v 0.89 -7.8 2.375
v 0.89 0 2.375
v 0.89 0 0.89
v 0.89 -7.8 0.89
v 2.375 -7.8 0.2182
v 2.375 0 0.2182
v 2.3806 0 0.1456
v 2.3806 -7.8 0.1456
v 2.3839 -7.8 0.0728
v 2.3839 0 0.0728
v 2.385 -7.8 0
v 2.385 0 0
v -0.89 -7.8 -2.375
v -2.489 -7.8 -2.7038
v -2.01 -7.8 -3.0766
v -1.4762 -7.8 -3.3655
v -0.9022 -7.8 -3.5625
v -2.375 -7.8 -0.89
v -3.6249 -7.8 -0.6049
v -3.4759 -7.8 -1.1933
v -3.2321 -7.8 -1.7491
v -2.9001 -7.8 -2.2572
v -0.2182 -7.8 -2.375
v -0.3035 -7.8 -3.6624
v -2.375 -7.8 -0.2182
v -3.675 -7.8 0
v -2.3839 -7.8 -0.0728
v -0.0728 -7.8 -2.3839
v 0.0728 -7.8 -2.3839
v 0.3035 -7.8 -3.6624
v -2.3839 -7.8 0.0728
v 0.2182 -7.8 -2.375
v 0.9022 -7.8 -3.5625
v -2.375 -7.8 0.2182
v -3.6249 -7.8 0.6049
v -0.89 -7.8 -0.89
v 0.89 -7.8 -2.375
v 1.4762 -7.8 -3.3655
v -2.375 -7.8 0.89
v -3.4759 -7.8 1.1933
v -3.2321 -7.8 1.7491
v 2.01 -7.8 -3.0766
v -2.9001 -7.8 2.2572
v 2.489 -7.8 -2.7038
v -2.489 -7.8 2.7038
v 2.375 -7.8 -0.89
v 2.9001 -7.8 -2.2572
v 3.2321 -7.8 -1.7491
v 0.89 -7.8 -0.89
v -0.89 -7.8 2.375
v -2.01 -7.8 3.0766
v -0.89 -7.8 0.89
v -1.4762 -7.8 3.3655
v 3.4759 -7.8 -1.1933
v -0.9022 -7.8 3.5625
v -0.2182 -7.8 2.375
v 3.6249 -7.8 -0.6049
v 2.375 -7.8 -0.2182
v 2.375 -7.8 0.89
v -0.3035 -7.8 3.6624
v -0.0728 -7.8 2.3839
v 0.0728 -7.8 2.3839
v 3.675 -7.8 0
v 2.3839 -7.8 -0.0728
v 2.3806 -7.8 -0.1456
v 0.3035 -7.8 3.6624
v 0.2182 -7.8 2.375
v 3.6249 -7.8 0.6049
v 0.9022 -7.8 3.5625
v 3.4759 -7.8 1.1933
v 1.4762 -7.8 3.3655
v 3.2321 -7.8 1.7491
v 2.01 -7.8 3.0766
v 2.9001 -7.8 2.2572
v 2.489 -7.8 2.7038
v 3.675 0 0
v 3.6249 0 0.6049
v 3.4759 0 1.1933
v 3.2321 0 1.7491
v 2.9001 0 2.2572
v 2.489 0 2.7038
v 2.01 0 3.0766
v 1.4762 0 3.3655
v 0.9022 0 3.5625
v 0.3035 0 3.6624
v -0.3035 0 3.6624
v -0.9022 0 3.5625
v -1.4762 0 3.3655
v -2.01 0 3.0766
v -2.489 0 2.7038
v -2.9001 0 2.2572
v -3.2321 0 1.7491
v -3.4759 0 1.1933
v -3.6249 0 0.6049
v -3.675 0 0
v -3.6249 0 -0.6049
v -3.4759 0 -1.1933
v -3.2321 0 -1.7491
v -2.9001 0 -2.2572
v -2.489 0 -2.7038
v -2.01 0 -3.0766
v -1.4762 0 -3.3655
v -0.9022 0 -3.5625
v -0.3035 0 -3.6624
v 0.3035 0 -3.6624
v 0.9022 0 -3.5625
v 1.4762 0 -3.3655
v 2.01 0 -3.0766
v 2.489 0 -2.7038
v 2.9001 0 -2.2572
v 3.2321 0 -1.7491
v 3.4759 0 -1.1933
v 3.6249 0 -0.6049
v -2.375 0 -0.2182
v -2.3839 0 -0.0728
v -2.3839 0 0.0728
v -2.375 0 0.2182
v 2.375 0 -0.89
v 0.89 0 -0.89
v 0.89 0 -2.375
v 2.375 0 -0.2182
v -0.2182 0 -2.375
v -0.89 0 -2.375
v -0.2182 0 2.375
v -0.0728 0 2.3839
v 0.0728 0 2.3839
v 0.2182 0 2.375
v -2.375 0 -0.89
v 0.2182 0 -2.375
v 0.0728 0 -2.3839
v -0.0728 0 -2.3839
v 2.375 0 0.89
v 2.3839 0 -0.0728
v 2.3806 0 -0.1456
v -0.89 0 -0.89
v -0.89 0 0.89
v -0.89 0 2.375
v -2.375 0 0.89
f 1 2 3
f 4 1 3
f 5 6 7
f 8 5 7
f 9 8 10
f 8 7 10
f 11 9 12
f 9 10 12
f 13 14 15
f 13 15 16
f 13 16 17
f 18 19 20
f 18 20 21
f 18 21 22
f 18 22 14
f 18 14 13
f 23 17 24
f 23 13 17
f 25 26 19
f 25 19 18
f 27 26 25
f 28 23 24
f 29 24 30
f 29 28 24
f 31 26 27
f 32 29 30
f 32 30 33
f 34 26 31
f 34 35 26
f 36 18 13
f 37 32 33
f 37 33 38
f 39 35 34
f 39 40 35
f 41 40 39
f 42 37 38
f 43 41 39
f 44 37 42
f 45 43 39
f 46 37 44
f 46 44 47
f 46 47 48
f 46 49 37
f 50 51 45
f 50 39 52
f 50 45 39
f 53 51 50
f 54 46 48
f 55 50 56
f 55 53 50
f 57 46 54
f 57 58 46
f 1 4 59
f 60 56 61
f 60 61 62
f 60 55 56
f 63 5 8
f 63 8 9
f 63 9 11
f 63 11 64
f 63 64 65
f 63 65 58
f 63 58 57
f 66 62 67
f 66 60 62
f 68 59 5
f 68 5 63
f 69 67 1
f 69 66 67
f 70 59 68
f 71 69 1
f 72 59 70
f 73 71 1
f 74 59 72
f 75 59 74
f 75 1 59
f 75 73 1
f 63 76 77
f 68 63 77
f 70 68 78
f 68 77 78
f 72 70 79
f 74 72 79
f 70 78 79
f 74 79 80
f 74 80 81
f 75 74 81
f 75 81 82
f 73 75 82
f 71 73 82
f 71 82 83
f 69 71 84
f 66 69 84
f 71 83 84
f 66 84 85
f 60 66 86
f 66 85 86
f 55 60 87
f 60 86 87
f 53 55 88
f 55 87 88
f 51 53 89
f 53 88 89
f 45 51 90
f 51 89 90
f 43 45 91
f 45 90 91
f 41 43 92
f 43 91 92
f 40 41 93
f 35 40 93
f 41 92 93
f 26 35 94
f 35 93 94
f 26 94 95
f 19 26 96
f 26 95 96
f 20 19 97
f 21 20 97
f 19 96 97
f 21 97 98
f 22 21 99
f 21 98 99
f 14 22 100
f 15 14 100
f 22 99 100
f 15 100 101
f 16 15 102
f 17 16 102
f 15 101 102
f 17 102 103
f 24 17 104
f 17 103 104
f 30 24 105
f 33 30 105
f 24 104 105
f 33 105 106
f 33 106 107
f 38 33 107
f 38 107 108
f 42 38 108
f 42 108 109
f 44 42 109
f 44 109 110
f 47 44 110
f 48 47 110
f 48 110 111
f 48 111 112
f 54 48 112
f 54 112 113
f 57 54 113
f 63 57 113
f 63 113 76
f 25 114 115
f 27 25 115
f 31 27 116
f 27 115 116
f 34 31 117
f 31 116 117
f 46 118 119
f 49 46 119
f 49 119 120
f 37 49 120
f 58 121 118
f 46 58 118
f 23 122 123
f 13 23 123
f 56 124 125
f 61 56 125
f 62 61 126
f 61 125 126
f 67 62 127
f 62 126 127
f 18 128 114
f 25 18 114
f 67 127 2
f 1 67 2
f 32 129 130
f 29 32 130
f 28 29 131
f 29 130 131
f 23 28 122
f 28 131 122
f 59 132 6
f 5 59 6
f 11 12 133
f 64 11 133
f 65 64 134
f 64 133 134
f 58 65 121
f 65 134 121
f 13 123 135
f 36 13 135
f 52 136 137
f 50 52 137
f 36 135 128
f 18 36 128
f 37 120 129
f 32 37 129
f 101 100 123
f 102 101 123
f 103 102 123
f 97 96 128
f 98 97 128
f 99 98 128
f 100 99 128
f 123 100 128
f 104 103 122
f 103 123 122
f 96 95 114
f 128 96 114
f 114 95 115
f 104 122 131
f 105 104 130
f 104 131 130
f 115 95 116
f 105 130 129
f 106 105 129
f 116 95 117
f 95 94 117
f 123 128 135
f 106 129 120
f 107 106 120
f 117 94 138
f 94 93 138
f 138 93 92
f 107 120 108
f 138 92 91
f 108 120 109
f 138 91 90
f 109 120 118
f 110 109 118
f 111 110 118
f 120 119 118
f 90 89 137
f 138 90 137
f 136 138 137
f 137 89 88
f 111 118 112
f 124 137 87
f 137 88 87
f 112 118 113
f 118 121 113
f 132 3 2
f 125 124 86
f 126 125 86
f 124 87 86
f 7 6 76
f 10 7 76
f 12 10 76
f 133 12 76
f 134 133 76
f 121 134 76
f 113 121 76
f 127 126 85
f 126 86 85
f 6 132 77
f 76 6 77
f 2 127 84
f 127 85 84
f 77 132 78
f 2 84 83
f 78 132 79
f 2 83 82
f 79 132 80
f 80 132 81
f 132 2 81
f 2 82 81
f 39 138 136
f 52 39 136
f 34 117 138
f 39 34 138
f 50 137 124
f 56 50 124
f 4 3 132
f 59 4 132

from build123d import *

# Parameters (mm, degrees)
F0_R     = 3.675
F1_DEPTH = 7.8
F2_DEPTH = 7.8


# Not quite as in the source:
# - a feature names something its author has since deleted; it is built from what else it names


with BuildPart() as f1:
    # F0 (on Front) → F1 (new body)
    with BuildSketch(Plane.XZ):
        Circle(F0_R)
        with BuildLine():
            Line((-2.375, 0.2181742423), (-2.375, 0.89))
            Line((-2.375, 0.89), (-2.2127189157, 0.89))
            ThreePointArc((-2.2127189157, 0.89), (-1.6864496731, 1.6864496731), (-0.89, 2.2127189157))
            Line((-0.89, 2.2127189157), (-0.89, 2.375))
            Line((-0.89, 2.375), (-0.2181742423, 2.375))
            ThreePointArc((-0.2181742423, 2.375), (0, 2.385), (0.2181742423, 2.375))
            Line((0.2181742423, 2.375), (0.89, 2.375))
            Line((0.89, 2.375), (0.89, 2.2127189157))
            ThreePointArc((0.89, 2.2127189157), (1.6864496731, 1.6864496731), (2.2127189157, 0.89))
            Line((2.2127189157, 0.89), (2.375, 0.89))
            Line((2.375, 0.89), (2.375, 0.2181742423))
            ThreePointArc((2.375, 0.2181742423), (2.3824986884, 0.1092016483), (2.385, 0))
            ThreePointArc((2.385, 0), (2.3824986884, -0.1092016483), (2.375, -0.2181742423))
            Line((2.375, -0.2181742423), (2.375, -0.89))
            Line((2.375, -0.89), (2.2127189157, -0.89))
            ThreePointArc((2.2127189157, -0.89), (1.6864496731, -1.6864496731), (0.89, -2.2127189157))
            Line((0.89, -2.2127189157), (0.89, -2.375))
            Line((0.89, -2.375), (0.2181742423, -2.375))
            ThreePointArc((0.2181742423, -2.375), (0, -2.385), (-0.2181742423, -2.375))
            Line((-0.2181742423, -2.375), (-0.89, -2.375))
            Line((-0.89, -2.375), (-0.89, -2.2127189157))
            ThreePointArc((-0.89, -2.2127189157), (-1.6864496731, -1.6864496731), (-2.2127189157, -0.89))
            Line((-2.2127189157, -0.89), (-2.375, -0.89))
            Line((-2.375, -0.89), (-2.375, -0.2181742423))
            ThreePointArc((-2.375, -0.2181742423), (-2.385, 0), (-2.375, 0.2181742423))
        make_face(mode=Mode.SUBTRACT)
    extrude(amount=F1_DEPTH)

    # F0 (on Front) → F2 (join)
    with BuildSketch(Plane.XZ):
        with BuildLine():
            ThreePointArc((-0.89, 2.2127189157), (-1.6864496731, 1.6864496731), (-2.2127189157, 0.89))
            Line((-2.2127189157, 0.89), (-0.89, 0.89))
            Line((-0.89, 0.89), (-0.89, 2.2127189157))
        make_face()
        with BuildLine():
            Line((0.89, 2.2127189157), (0.89, 0.89))
            Line((0.89, 0.89), (2.2127189157, 0.89))
            ThreePointArc((2.2127189157, 0.89), (1.6864496731, 1.6864496731), (0.89, 2.2127189157))
        make_face()
        with BuildLine():
            Line((-0.89, -0.89), (-2.2127189157, -0.89))
            ThreePointArc((-2.2127189157, -0.89), (-1.6864496731, -1.6864496731), (-0.89, -2.2127189157))
            Line((-0.89, -2.2127189157), (-0.89, -0.89))
        make_face()
        with BuildLine():
            Line((2.2127189157, -0.89), (0.89, -0.89))
            Line((0.89, -0.89), (0.89, -2.2127189157))
            ThreePointArc((0.89, -2.2127189157), (1.6864496731, -1.6864496731), (2.2127189157, -0.89))
        make_face()
    extrude(amount=F2_DEPTH)


solid = f1.part
